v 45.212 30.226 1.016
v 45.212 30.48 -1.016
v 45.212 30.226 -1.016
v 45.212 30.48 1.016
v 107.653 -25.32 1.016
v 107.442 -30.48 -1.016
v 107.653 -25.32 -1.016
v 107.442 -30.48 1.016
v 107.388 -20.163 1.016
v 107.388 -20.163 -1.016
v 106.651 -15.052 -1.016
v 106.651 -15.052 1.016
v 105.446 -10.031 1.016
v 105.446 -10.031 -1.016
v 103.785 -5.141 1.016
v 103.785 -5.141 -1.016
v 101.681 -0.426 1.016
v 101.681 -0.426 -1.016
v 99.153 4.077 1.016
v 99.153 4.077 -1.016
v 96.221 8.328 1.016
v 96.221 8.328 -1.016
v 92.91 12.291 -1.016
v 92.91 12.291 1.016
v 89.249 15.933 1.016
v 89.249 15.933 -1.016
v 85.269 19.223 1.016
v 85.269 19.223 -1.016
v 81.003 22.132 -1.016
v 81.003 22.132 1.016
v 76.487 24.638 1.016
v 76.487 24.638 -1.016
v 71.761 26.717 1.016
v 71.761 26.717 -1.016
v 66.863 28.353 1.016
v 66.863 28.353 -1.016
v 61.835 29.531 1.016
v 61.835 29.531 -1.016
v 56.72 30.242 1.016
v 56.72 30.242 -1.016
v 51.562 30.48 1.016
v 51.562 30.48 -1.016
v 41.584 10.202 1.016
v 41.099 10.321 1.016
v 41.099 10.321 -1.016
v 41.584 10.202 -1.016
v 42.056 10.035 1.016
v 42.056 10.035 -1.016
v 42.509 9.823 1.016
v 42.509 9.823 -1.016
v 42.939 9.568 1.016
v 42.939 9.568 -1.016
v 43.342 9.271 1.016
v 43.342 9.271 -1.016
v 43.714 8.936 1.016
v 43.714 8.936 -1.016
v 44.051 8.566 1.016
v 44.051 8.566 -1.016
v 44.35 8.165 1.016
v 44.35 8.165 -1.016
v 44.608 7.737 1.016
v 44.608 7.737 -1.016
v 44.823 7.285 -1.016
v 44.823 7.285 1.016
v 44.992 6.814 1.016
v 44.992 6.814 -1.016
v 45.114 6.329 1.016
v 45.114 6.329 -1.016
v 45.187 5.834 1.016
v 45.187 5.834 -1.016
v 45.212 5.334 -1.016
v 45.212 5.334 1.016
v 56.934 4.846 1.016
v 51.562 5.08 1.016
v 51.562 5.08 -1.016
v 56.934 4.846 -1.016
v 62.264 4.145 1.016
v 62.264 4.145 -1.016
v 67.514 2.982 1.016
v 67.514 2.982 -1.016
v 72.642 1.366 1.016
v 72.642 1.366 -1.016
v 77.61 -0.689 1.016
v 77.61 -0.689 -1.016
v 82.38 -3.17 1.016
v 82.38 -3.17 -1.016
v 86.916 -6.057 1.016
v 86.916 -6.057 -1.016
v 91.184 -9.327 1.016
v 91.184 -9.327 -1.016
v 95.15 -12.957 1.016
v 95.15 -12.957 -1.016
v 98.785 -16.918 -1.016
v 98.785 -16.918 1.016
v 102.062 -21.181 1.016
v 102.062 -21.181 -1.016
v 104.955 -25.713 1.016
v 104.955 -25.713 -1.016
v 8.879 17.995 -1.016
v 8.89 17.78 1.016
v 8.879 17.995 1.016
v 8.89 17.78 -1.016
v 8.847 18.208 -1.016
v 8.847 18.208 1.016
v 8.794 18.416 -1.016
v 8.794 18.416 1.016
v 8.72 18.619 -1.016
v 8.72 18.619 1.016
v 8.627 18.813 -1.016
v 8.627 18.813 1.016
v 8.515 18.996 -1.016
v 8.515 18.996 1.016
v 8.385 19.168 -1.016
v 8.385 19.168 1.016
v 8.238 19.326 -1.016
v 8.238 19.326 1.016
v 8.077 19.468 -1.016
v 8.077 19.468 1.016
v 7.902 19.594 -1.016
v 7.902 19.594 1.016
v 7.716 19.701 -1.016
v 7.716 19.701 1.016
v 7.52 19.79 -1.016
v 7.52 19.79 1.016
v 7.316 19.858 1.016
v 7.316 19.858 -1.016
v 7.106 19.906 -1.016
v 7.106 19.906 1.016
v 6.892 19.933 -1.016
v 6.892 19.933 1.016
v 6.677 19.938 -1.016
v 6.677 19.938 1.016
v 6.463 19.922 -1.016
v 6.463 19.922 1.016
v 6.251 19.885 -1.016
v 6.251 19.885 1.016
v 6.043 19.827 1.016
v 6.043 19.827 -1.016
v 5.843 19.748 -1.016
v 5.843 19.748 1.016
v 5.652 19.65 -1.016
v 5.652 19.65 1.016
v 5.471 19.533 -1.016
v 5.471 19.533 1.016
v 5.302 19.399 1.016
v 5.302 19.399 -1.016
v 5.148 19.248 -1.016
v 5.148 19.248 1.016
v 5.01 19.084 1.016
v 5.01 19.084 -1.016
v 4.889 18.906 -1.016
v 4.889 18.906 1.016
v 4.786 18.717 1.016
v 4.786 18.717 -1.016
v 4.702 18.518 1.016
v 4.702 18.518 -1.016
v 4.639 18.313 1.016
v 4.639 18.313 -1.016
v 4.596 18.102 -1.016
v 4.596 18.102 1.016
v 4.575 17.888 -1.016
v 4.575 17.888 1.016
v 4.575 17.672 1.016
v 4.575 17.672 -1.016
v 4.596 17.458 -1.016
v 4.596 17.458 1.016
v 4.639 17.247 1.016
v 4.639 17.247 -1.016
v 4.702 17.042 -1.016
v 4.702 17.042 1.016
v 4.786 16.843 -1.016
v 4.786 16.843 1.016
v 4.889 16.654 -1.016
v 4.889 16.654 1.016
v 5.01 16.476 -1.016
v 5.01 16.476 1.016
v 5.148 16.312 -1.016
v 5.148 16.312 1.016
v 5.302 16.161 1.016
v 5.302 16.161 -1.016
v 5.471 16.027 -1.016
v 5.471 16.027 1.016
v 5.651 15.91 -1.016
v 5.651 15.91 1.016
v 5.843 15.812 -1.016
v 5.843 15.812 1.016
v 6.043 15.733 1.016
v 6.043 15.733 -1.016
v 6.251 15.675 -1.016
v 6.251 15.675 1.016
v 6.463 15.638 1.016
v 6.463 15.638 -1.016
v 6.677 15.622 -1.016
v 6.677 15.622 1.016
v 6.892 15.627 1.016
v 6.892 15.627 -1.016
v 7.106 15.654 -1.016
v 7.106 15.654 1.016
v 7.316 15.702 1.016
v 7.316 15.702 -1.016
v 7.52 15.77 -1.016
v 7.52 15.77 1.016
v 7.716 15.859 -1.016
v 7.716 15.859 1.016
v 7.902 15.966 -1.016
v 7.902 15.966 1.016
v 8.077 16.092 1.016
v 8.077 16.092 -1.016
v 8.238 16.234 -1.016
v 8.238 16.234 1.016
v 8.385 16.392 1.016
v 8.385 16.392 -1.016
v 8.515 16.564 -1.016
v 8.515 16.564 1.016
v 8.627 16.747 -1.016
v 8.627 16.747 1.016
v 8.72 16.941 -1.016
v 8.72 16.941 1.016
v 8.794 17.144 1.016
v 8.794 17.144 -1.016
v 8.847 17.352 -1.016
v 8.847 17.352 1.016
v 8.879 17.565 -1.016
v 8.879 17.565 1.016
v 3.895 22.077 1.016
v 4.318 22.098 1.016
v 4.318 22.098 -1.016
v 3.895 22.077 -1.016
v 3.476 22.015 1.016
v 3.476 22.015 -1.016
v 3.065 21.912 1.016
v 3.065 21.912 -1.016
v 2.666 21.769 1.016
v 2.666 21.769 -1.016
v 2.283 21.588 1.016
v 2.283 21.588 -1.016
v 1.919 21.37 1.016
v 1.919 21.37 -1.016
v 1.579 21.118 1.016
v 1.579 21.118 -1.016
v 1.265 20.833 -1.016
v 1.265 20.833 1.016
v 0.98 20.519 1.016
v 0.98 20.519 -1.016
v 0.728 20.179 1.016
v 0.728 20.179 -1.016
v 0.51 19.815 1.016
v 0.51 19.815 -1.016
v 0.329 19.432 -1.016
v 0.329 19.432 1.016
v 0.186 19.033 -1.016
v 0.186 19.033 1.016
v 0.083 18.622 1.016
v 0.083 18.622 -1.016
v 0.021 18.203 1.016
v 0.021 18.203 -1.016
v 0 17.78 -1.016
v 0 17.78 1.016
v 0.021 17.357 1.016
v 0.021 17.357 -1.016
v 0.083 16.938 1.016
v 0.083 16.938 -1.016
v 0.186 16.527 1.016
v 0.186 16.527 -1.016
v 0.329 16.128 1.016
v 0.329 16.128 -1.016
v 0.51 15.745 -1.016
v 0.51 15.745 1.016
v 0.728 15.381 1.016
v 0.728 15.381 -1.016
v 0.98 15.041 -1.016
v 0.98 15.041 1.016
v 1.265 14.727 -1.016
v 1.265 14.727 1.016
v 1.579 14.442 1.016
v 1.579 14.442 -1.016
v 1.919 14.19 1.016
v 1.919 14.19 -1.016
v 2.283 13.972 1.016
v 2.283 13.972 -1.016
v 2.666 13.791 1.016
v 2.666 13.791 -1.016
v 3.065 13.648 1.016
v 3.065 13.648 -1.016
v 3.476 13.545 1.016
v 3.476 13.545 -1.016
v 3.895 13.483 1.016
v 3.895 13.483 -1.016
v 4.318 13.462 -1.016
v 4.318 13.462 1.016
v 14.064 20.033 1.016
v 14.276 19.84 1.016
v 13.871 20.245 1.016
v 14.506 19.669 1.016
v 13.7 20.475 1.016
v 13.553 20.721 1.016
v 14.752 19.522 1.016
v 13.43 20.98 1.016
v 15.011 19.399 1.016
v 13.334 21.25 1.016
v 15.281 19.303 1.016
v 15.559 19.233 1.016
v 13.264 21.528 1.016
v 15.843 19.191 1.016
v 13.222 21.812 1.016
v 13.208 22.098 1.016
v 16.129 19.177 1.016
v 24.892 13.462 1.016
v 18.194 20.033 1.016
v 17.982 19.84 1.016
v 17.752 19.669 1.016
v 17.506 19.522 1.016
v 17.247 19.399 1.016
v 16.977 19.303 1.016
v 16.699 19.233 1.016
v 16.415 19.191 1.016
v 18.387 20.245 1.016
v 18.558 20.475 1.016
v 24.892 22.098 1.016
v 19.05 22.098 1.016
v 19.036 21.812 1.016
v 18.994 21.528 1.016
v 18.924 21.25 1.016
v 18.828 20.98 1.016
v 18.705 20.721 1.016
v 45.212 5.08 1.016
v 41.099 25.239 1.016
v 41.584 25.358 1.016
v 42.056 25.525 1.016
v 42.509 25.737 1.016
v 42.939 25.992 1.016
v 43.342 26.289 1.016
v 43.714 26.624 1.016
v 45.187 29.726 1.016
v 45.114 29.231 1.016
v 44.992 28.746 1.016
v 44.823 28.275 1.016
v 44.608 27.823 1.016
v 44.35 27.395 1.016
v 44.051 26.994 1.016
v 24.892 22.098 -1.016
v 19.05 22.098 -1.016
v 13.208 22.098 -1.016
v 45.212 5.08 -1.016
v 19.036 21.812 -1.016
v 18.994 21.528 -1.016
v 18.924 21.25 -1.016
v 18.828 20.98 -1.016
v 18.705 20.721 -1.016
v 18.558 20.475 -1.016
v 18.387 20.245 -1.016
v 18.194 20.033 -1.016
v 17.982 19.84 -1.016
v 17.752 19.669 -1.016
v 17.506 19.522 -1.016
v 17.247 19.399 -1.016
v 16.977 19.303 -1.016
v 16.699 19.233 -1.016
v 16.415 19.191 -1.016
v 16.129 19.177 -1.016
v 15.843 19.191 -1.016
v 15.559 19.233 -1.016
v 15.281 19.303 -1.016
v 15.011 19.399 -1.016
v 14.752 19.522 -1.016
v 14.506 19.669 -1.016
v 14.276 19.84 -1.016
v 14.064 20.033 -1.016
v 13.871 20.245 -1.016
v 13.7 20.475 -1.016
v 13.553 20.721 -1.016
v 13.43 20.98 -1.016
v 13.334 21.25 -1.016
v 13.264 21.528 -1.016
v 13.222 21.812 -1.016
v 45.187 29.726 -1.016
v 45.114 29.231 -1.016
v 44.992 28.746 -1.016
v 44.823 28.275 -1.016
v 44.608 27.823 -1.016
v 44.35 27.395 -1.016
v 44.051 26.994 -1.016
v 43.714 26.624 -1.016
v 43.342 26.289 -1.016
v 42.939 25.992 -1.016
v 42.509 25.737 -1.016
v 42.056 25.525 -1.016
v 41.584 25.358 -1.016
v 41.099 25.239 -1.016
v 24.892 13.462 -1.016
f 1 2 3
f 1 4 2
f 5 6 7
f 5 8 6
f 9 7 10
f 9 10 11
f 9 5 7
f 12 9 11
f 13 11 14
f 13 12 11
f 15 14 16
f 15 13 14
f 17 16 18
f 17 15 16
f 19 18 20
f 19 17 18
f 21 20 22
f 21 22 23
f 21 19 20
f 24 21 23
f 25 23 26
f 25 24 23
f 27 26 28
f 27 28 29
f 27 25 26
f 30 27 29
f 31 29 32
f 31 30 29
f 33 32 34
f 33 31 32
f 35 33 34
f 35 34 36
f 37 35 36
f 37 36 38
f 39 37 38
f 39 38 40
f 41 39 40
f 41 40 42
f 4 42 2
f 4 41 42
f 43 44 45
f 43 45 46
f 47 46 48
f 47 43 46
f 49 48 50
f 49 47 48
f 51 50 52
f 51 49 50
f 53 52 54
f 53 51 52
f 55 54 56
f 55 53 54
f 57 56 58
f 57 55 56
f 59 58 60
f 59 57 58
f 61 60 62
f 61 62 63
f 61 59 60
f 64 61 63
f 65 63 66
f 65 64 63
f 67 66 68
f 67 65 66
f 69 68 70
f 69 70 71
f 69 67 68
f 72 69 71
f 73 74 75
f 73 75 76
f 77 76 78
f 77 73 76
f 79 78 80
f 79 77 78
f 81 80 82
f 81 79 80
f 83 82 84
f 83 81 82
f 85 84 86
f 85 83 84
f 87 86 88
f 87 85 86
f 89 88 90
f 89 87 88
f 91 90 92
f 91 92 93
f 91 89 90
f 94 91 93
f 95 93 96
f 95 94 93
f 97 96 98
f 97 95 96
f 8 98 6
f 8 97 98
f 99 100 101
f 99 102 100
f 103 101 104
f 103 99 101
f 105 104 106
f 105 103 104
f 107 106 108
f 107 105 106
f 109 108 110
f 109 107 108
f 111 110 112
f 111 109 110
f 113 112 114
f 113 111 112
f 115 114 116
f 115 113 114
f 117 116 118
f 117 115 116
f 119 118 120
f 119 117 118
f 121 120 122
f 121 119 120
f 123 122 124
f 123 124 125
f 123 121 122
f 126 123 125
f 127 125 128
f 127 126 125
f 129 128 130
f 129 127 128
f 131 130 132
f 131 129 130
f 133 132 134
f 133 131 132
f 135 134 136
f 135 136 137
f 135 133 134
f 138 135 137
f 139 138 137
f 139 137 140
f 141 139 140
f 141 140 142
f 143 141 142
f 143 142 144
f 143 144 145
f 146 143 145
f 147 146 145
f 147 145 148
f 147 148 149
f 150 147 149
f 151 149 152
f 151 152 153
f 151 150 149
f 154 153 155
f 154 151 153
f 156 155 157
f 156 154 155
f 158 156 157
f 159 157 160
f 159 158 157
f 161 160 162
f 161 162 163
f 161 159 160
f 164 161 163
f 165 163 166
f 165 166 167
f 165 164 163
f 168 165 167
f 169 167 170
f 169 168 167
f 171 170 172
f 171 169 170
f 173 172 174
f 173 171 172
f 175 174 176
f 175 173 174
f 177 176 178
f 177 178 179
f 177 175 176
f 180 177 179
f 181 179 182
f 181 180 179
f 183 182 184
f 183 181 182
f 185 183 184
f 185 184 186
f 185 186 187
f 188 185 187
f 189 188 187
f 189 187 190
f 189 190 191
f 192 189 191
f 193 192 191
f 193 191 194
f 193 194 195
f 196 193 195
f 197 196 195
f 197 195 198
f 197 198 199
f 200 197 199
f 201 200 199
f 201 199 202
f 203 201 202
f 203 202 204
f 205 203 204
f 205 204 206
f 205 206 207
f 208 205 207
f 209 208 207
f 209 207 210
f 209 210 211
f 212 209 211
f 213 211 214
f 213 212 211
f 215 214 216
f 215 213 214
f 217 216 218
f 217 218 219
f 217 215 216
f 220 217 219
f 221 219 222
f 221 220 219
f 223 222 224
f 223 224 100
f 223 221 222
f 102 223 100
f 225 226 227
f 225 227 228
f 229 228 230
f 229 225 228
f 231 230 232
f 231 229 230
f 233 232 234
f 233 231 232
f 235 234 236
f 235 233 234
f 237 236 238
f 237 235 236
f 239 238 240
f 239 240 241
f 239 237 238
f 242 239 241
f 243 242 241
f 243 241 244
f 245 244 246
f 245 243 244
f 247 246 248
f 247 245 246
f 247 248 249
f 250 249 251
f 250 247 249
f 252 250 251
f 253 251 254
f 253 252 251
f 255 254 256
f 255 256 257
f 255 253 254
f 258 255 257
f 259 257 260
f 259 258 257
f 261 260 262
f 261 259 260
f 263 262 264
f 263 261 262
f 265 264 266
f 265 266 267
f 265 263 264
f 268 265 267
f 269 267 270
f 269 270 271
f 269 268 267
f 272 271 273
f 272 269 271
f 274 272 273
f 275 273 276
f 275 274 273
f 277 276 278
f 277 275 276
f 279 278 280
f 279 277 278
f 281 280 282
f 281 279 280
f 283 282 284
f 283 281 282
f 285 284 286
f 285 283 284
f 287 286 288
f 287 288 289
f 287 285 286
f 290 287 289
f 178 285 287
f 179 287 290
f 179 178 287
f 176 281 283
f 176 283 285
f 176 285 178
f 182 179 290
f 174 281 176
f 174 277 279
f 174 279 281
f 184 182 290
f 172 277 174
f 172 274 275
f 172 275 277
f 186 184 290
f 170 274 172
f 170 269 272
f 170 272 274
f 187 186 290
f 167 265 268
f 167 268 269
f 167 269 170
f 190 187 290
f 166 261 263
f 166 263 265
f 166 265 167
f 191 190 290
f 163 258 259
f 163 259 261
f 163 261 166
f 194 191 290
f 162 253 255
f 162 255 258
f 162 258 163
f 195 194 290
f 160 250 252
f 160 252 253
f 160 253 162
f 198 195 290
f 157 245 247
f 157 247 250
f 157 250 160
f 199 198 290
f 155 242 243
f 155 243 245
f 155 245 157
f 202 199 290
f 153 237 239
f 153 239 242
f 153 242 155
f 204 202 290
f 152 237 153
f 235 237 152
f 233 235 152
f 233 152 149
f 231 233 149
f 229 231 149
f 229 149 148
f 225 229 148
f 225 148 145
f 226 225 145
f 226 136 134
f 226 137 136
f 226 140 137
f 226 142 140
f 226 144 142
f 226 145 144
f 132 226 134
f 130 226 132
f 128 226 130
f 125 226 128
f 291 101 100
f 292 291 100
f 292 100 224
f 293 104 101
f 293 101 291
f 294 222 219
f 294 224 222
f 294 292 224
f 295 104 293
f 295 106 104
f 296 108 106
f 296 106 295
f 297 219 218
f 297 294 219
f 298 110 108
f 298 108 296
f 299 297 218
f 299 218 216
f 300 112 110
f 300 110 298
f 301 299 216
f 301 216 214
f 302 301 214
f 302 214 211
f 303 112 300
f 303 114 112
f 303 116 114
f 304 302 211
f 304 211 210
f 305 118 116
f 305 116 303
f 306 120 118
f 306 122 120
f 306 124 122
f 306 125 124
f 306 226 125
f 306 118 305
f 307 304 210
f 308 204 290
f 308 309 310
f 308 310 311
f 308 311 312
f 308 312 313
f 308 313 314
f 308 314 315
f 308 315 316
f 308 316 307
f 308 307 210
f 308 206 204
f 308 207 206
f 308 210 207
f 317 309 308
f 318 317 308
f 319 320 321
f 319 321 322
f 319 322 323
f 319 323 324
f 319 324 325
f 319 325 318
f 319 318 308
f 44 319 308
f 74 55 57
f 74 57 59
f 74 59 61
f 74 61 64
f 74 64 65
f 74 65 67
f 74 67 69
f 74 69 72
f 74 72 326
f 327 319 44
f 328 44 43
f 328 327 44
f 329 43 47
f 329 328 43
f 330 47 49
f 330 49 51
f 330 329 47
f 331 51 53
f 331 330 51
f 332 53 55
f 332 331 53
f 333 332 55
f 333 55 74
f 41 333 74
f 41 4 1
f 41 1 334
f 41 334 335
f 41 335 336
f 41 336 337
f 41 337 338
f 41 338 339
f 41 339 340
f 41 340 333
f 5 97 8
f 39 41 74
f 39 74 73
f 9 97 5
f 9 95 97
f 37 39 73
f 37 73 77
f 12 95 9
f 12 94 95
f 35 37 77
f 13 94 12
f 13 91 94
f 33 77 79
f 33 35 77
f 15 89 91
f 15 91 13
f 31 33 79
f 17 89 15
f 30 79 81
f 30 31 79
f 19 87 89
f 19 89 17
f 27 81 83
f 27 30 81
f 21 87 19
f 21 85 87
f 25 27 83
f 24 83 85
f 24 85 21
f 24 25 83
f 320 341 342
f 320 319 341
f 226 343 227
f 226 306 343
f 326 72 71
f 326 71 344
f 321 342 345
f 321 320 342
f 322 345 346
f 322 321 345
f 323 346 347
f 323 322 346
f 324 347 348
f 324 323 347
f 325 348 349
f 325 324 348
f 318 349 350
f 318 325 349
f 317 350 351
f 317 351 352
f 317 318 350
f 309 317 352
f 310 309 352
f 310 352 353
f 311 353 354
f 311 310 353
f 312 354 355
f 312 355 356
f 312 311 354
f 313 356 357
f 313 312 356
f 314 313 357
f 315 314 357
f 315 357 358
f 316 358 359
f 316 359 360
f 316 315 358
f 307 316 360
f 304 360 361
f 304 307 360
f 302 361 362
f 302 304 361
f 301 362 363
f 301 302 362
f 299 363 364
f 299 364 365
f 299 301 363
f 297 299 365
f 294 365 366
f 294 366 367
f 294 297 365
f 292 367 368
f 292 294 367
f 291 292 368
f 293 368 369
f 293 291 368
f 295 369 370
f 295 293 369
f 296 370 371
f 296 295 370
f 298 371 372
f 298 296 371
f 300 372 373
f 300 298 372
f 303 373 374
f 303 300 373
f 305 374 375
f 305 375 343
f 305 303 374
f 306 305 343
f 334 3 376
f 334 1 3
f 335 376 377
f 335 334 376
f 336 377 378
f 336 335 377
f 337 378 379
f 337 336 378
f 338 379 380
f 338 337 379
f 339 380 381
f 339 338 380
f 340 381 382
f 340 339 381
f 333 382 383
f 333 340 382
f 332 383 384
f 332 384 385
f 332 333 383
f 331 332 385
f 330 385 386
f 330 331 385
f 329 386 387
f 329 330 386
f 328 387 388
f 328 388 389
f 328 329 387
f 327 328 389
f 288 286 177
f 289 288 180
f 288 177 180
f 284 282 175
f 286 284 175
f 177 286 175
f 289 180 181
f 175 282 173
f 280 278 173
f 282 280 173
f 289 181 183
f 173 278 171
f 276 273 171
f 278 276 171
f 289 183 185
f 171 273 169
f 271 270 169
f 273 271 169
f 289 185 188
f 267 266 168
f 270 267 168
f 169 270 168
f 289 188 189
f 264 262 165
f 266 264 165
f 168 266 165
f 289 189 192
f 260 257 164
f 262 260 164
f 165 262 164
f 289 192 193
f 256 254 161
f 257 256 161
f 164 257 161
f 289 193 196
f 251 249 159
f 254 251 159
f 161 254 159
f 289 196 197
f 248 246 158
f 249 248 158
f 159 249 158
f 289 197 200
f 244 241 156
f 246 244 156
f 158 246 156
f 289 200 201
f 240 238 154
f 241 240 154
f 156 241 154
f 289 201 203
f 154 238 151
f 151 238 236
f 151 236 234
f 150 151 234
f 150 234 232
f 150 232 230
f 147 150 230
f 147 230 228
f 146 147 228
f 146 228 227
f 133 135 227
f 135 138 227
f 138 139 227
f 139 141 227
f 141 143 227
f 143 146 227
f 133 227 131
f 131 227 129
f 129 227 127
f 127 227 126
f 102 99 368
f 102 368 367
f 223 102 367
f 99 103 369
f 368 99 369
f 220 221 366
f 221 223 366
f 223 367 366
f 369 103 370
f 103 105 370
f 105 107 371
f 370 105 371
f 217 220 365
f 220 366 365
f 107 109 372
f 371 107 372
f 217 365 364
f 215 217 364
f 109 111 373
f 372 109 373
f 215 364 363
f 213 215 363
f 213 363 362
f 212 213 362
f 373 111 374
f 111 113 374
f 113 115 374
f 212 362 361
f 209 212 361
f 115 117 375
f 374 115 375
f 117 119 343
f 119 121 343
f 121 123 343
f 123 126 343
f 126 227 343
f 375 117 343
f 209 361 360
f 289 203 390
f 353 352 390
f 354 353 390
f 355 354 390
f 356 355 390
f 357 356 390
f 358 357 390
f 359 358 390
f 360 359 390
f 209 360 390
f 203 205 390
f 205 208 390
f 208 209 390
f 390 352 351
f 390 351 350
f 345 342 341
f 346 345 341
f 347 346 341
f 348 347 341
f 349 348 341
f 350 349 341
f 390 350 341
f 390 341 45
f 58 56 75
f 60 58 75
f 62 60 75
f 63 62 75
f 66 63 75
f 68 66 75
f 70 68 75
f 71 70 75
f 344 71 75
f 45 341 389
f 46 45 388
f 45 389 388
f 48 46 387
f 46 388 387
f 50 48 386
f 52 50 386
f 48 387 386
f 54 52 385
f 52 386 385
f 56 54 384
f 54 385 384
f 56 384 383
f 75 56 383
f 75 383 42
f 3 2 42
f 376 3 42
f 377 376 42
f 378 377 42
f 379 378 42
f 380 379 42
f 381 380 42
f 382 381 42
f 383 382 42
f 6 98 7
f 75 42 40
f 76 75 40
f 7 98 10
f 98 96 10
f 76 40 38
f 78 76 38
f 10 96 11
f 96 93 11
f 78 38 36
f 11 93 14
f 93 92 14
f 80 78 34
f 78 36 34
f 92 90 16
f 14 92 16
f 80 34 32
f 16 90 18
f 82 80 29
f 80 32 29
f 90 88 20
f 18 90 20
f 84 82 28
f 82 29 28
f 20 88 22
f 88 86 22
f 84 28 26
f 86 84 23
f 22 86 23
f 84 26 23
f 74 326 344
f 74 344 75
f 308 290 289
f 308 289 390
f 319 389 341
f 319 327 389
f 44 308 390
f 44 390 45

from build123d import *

# Parameters (mm, degrees)
F0_R     = 2.159
F1_DEPTH = 1.016


with BuildPart() as f1:
    # F0 (on Top) → F1 (new body, symmetric)
    with BuildSketch(Plane.XY):
        with BuildLine():
            Line((13.208, 22.098), (4.318, 22.098))
            ThreePointArc((4.318, 22.098), (0, 17.78), (4.318, 13.462))
            Line((4.318, 13.462), (24.892, 13.462))
            Line((24.892, 13.462), (41.098512, 10.321209))
            ThreePointArc((41.098512, 10.321209), (44.050946, 8.566377), (45.212, 5.334))
            Line((45.212, 5.334), (45.212, 5.08))
            Line((45.212, 5.08), (51.562, 5.08))
            ThreePointArc((51.562, 5.08), (84.679548, -4.563853), (107.442, -30.48))
            ThreePointArc((107.442, -30.48), (92.910204, 12.290854), (51.562, 30.48))
            Line((51.562, 30.48), (45.212, 30.48))
            Line((45.212, 30.48), (45.212, 30.226))
            ThreePointArc((45.212, 30.226), (44.050946, 26.993623), (41.098512, 25.238791))
            Line((41.098512, 25.238791), (24.892, 22.098))
            Line((24.892, 22.098), (19.05, 22.098))
            ThreePointArc((19.05, 22.098), (16.129, 19.177), (13.208, 22.098))
        make_face()
        with Locations((6.731, 17.78)):
            Circle(F0_R, mode=Mode.SUBTRACT)
    extrude(amount=F1_DEPTH, both=True)


solid = f1.part
